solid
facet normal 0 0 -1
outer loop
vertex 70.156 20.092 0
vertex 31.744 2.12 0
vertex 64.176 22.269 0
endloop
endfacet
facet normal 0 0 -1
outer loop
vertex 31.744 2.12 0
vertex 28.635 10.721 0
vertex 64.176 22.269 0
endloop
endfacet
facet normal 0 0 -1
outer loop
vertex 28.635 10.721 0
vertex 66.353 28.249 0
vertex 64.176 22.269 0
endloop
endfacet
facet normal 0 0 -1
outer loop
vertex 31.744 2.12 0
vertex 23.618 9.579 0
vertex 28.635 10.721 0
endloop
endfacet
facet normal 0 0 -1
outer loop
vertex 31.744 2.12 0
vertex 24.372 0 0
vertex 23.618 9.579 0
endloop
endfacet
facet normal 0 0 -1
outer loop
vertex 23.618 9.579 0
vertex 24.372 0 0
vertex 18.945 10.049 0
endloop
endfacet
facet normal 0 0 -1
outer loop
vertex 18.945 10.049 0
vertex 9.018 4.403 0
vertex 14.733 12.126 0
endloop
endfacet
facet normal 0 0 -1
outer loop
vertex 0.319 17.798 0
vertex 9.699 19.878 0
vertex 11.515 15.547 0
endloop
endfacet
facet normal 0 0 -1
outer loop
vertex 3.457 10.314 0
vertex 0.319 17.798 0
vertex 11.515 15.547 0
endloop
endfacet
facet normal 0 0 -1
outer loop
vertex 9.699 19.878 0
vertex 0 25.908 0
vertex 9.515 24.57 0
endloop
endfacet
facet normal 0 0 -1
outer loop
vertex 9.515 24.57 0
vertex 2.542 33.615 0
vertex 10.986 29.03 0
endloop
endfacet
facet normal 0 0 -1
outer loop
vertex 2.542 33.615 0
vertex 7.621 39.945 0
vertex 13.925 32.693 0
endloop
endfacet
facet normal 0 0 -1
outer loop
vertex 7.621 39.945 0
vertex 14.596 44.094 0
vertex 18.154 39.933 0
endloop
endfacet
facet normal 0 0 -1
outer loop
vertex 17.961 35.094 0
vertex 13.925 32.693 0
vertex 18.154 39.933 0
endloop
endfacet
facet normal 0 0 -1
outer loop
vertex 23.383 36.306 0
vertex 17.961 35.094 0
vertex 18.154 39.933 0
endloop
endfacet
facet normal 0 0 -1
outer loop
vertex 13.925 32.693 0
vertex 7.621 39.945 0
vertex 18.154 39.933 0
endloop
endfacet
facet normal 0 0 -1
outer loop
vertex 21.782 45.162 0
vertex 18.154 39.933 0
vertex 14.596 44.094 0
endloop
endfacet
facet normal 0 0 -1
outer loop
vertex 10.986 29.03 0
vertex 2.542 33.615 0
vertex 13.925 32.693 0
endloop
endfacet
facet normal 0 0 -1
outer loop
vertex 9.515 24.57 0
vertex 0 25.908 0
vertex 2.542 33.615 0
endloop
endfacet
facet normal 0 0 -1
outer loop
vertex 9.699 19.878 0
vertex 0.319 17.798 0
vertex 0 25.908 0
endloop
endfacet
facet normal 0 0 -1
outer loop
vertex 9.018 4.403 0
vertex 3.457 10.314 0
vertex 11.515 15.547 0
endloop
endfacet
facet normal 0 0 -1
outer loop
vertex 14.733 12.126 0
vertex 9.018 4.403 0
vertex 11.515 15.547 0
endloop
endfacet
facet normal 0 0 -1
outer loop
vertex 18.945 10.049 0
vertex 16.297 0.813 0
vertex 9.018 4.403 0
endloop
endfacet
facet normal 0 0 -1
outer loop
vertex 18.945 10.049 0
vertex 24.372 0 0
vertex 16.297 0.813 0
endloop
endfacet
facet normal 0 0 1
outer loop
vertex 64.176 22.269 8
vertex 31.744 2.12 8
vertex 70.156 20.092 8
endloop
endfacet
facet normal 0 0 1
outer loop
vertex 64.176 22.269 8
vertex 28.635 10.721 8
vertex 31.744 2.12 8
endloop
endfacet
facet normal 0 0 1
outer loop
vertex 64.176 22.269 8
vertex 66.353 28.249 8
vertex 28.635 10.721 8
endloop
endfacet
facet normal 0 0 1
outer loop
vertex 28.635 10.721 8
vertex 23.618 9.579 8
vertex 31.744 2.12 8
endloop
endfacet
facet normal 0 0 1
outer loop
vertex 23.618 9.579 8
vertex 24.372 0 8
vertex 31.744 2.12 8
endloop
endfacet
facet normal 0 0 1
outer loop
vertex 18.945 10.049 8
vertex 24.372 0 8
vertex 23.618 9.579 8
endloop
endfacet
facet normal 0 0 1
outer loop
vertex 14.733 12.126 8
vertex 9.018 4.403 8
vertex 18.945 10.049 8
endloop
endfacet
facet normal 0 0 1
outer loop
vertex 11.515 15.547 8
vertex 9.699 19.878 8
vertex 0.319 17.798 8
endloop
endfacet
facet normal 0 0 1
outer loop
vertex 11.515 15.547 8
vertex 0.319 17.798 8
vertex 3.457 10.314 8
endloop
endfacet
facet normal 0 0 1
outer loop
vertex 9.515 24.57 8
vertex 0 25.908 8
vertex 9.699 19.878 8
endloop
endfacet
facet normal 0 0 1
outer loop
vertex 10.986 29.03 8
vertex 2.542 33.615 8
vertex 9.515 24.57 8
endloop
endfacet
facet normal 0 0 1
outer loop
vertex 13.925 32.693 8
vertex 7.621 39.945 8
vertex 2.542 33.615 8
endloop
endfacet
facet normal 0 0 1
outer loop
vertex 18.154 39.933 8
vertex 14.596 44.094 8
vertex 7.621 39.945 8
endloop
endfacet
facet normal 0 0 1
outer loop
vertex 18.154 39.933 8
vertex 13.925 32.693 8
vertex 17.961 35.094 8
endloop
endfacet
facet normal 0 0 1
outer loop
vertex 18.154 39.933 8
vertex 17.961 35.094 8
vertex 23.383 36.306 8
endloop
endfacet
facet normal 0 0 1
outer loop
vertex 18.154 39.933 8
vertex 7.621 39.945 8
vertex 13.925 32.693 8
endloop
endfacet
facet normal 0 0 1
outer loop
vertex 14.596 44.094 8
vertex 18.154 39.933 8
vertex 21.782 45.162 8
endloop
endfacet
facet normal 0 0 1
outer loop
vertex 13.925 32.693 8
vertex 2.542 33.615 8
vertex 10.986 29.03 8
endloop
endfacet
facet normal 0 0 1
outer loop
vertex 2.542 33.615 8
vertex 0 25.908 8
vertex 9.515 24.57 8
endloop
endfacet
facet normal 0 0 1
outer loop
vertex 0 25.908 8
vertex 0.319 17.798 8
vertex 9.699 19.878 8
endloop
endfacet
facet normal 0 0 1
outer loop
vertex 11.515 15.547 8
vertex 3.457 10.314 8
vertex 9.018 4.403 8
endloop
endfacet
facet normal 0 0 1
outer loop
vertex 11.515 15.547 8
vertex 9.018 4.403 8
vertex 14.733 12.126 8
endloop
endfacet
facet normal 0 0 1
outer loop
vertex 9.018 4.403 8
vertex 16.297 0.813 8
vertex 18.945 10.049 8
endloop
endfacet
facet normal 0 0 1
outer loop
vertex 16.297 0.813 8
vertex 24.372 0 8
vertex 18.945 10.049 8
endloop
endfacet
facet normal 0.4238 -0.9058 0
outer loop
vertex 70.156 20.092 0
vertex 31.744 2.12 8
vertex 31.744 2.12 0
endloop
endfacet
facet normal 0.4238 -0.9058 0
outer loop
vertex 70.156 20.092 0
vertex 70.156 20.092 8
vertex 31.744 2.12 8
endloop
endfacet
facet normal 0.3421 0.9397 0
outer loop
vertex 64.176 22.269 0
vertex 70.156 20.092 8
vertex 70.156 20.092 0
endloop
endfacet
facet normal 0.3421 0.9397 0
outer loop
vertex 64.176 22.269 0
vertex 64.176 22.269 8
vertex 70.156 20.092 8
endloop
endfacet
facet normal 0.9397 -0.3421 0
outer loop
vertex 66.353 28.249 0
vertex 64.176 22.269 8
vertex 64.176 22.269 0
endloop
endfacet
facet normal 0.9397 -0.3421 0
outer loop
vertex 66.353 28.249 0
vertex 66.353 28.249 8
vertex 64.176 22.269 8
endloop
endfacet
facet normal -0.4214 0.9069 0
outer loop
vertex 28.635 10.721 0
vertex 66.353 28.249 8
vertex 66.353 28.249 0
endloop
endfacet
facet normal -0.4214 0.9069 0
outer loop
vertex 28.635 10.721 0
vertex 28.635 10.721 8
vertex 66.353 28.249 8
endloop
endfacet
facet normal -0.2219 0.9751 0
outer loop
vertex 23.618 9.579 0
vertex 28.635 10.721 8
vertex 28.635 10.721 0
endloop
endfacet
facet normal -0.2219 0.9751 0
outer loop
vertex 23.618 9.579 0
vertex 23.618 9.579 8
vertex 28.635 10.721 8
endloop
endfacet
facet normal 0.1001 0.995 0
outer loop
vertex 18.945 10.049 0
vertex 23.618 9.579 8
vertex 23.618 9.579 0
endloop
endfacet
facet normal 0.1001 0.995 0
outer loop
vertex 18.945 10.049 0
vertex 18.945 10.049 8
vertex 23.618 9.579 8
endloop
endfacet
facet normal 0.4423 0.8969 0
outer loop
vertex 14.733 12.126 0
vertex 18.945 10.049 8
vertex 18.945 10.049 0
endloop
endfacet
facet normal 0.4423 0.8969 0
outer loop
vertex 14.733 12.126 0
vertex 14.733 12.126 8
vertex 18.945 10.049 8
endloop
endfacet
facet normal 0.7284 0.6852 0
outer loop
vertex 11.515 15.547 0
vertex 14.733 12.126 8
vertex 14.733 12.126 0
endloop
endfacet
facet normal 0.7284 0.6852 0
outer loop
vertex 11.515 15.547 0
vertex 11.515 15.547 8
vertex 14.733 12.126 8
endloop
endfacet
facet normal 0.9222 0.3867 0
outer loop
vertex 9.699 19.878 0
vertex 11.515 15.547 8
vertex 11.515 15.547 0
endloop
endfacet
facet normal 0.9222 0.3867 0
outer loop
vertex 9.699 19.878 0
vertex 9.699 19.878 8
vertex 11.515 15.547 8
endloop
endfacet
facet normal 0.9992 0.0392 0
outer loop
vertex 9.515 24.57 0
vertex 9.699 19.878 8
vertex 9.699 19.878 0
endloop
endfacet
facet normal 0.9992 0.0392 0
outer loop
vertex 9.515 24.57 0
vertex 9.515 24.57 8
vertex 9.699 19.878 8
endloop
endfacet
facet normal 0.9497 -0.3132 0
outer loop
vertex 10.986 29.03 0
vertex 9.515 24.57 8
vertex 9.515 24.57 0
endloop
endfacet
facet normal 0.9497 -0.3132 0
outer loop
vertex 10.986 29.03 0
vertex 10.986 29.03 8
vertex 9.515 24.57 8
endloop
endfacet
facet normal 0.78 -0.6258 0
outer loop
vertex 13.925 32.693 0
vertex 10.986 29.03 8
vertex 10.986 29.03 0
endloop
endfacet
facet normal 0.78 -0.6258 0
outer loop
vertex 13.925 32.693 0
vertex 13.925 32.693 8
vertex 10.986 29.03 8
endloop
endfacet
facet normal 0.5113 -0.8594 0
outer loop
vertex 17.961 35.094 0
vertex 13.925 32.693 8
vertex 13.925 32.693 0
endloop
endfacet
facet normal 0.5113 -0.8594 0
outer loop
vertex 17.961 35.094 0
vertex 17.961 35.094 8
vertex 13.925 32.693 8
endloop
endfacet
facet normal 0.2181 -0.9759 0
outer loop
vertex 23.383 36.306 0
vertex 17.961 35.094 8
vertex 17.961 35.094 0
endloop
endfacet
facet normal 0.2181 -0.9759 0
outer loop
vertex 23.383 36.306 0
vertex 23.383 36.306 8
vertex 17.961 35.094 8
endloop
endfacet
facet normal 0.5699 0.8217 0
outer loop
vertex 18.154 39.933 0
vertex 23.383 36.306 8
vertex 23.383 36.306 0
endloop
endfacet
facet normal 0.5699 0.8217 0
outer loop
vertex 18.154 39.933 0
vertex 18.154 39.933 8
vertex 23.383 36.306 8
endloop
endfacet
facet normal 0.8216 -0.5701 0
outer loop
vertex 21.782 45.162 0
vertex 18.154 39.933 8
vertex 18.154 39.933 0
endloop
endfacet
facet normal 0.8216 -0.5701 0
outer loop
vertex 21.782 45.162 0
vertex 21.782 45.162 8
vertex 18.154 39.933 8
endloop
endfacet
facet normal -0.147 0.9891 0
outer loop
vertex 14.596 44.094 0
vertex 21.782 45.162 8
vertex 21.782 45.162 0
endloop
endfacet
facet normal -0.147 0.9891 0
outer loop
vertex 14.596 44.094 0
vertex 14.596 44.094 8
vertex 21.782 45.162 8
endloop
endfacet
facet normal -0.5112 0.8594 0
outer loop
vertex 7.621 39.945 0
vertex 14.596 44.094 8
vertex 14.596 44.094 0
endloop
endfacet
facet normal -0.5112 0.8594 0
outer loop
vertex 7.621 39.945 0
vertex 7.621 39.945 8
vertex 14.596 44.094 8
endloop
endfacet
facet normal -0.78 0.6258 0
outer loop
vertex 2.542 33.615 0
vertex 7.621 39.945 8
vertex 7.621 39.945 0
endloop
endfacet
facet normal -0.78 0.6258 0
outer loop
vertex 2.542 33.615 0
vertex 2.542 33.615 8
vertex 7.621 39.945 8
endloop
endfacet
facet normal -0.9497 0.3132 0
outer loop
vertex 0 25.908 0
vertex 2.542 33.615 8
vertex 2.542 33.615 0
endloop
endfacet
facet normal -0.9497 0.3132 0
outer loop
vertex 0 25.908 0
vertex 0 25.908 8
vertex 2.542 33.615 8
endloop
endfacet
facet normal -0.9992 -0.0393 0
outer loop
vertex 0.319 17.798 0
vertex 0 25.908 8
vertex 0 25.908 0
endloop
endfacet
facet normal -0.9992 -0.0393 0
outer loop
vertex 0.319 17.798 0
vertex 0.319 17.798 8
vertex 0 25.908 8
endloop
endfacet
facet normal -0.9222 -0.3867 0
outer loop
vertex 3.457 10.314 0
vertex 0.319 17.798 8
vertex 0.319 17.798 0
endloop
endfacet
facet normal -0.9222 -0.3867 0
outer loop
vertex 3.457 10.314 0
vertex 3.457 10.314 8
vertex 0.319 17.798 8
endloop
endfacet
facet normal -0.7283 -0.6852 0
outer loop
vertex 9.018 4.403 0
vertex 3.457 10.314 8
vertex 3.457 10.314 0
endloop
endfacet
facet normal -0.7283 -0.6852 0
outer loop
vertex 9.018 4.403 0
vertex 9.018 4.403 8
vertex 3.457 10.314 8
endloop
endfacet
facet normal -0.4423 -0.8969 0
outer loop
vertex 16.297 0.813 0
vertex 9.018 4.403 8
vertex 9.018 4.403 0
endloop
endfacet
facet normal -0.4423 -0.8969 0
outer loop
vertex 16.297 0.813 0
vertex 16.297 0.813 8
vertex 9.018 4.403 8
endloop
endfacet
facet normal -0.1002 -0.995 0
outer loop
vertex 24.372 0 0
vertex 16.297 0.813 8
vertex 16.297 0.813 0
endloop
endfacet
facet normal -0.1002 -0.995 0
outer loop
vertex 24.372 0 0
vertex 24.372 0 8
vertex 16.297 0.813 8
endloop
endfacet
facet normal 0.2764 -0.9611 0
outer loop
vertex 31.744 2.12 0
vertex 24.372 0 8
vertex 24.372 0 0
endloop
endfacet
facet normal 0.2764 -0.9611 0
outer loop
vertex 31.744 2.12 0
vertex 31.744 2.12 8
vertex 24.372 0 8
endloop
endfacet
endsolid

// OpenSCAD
$fn = 32;

// ----------------------------------------------------------------------
// Hook plate: curl radius 18 mm over 205 degrees, 9 mm thick band
// ----------------------------------------------------------------------

// --- parameters (mm) ---
profile_height = 8;       // extrusion height
profile_points = 26;      // points of the closed outline

profile = [[18.154, 39.933], [21.782, 45.162], [14.596, 44.094], [7.621, 39.945], [2.542, 33.615], [0, 25.908], [0.319, 17.798], [3.457, 10.314], [9.018, 4.403], [16.297, 0.813], [24.372, 0], [31.744, 2.12], [70.156, 20.092], [64.176, 22.269], [66.353, 28.249], [28.635, 10.721], [23.618, 9.579], [18.945, 10.049], [14.733, 12.126], [11.515, 15.547], [9.699, 19.878], [9.515, 24.57], [10.986, 29.03], [13.925, 32.693], [17.961, 35.094], [23.383, 36.306]];  // single closed polygon, 26 points, counter clockwise

// --- the one profile operation ---
linear_extrude(height = profile_height) polygon(points = profile);
